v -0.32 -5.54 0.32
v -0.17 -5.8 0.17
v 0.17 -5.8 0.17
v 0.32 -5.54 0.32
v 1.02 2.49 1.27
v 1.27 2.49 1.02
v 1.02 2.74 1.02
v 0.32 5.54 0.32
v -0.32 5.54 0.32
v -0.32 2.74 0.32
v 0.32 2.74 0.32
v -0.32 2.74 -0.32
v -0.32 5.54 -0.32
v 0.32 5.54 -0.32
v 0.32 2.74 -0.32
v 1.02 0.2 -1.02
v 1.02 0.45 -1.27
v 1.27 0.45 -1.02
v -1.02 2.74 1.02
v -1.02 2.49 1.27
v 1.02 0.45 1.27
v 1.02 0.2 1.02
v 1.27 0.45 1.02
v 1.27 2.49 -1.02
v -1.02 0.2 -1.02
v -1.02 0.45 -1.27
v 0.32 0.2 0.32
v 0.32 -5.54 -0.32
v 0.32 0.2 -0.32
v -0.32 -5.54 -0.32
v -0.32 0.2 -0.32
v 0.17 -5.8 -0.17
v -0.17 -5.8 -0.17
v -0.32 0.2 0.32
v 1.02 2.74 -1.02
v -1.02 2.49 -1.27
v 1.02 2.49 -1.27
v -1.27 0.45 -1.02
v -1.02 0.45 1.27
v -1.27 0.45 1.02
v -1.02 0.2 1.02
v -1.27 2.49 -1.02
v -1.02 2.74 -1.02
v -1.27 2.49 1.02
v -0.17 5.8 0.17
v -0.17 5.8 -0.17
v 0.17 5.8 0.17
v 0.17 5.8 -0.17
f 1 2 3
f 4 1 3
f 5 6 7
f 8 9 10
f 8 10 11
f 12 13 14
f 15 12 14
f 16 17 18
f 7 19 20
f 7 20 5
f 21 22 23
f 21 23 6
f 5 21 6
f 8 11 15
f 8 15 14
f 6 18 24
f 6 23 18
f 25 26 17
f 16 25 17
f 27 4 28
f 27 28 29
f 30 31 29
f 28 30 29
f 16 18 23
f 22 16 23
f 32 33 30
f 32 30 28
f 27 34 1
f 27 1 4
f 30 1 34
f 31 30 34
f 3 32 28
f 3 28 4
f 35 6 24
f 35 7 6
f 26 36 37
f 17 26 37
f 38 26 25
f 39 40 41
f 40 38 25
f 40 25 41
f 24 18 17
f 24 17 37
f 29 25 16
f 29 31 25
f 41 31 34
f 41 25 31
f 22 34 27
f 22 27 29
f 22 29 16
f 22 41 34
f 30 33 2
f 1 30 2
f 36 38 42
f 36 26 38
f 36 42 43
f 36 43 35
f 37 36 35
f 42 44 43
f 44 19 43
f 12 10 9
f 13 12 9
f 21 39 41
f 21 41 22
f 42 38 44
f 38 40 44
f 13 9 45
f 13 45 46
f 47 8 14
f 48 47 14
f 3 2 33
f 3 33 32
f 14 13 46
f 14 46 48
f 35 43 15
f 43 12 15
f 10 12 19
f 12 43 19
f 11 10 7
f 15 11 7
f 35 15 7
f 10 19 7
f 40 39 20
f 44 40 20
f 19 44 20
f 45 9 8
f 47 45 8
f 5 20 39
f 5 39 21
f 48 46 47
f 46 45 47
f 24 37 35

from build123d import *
from OCP.BRepFilletAPI import BRepFilletAPI_MakeChamfer

# Parameters (mm, degrees)
ESBO_O1_W                = 0.64
ESBO_O1_H                = 11.6
RESSALTO_EXTRUS_O1_DEPTH = 0.32
ESBO_O2_W                = 2.54
ESBO_O2_H                = 2.54
RESSALTO_EXTRUS_O2_DEPTH = 1.27
CHANFRO1_SIZE            = 0.15
CHANFRO1_SIZE2           = 0.26
CHANFRO2_SIZE            = 0.26
CHANFRO2_SIZE2           = 0.15
CHANFRO3_SIZE            = 0.25


with BuildPart() as part:
    # Esboço1 → Ressalto-extrusão1 (new, symmetric)
    with BuildSketch(Plane.XY):
        Rectangle(ESBO_O1_W, ESBO_O1_H)
    extrude(amount=RESSALTO_EXTRUS_O1_DEPTH, both=True)

    # Esboço2 → Ressalto-extrusão2 (add, symmetric)
    with BuildSketch(Plane.XY):
        with Locations((0, 1.47)):
            Rectangle(ESBO_O2_W, ESBO_O2_H)
    extrude(amount=RESSALTO_EXTRUS_O2_DEPTH, both=True)

    # Chanfro1
    chanfro1_edges = [part.edges().sort_by_distance(p)[0] for p in [
        (0, 5.8, -0.32),
        (-0.32, 5.8, 0),
        (0.32, 5.8, 0),
        (0, 5.8, 0.32),
    ]]
    chanfro1_side = [part.faces().sort_by_distance(p)[0] for p in [
        (0, 5.8, 0),
    ]]
    chamfer(chanfro1_edges, length=CHANFRO1_SIZE, length2=CHANFRO1_SIZE2, reference=chanfro1_side[0])

    # Chanfro2: one chamfer whose edges measure the first distance from different faces: ONE call of the kernel's chamfer builder (chamfer() names one face for all edges)
    chanfro2_edges_1 = [part.edges().sort_by_distance(p)[0] for p in [
        (0, -5.8, 0.32),
    ]]
    chanfro2_side_1 = [part.faces().sort_by_distance(p)[0] for p in [
        (0, -2.8, 0.32),
    ]]
    chanfro2_edges_2 = [part.edges().sort_by_distance(p)[0] for p in [
        (0, -5.8, -0.32),
    ]]
    chanfro2_side_2 = [part.faces().sort_by_distance(p)[0] for p in [
        (0, -2.8, -0.32),
    ]]
    chanfro2_edges_3 = [part.edges().sort_by_distance(p)[0] for p in [
        (0.32, -5.8, 0),
    ]]
    chanfro2_side_3 = [part.faces().sort_by_distance(p)[0] for p in [
        (0.32, -2.8, 0),
    ]]
    chanfro2_edges_4 = [part.edges().sort_by_distance(p)[0] for p in [
        (-0.32, -5.8, 0),
    ]]
    chanfro2_side_4 = [part.faces().sort_by_distance(p)[0] for p in [
        (-0.32, -2.8, 0),
    ]]
    chanfro2 = BRepFilletAPI_MakeChamfer(part.part.solid().wrapped)
    for e in chanfro2_edges_1:
        chanfro2.Add(CHANFRO2_SIZE, CHANFRO2_SIZE2, e.wrapped, chanfro2_side_1[0].wrapped)  # the first distance lies on this face
    for e in chanfro2_edges_2:
        chanfro2.Add(CHANFRO2_SIZE, CHANFRO2_SIZE2, e.wrapped, chanfro2_side_2[0].wrapped)  # the first distance lies on this face
    for e in chanfro2_edges_3:
        chanfro2.Add(CHANFRO2_SIZE, CHANFRO2_SIZE2, e.wrapped, chanfro2_side_3[0].wrapped)  # the first distance lies on this face
    for e in chanfro2_edges_4:
        chanfro2.Add(CHANFRO2_SIZE, CHANFRO2_SIZE2, e.wrapped, chanfro2_side_4[0].wrapped)  # the first distance lies on this face
    add(Compound.cast(chanfro2.Shape()), mode=Mode.REPLACE)

    # Chanfro3
    chanfro3_edges = [part.edges().sort_by_distance(p)[0] for p in [
        (-1.27, 1.47, -1.27),
        (-1.27, 2.74, 0),
        (0, 0.2, -1.27),
        (-1.27, 0.2, 0),
        (1.27, 1.47, -1.27),
        (1.27, 0.2, 0),
        (0, 2.74, -1.27),
        (1.27, 2.74, 0),
        (-1.27, 1.47, 1.27),
        (0, 0.2, 1.27),
        (1.27, 1.47, 1.27),
        (0, 2.74, 1.27),
    ]]
    chamfer(chanfro3_edges, length=CHANFRO3_SIZE)


solid = part.part
